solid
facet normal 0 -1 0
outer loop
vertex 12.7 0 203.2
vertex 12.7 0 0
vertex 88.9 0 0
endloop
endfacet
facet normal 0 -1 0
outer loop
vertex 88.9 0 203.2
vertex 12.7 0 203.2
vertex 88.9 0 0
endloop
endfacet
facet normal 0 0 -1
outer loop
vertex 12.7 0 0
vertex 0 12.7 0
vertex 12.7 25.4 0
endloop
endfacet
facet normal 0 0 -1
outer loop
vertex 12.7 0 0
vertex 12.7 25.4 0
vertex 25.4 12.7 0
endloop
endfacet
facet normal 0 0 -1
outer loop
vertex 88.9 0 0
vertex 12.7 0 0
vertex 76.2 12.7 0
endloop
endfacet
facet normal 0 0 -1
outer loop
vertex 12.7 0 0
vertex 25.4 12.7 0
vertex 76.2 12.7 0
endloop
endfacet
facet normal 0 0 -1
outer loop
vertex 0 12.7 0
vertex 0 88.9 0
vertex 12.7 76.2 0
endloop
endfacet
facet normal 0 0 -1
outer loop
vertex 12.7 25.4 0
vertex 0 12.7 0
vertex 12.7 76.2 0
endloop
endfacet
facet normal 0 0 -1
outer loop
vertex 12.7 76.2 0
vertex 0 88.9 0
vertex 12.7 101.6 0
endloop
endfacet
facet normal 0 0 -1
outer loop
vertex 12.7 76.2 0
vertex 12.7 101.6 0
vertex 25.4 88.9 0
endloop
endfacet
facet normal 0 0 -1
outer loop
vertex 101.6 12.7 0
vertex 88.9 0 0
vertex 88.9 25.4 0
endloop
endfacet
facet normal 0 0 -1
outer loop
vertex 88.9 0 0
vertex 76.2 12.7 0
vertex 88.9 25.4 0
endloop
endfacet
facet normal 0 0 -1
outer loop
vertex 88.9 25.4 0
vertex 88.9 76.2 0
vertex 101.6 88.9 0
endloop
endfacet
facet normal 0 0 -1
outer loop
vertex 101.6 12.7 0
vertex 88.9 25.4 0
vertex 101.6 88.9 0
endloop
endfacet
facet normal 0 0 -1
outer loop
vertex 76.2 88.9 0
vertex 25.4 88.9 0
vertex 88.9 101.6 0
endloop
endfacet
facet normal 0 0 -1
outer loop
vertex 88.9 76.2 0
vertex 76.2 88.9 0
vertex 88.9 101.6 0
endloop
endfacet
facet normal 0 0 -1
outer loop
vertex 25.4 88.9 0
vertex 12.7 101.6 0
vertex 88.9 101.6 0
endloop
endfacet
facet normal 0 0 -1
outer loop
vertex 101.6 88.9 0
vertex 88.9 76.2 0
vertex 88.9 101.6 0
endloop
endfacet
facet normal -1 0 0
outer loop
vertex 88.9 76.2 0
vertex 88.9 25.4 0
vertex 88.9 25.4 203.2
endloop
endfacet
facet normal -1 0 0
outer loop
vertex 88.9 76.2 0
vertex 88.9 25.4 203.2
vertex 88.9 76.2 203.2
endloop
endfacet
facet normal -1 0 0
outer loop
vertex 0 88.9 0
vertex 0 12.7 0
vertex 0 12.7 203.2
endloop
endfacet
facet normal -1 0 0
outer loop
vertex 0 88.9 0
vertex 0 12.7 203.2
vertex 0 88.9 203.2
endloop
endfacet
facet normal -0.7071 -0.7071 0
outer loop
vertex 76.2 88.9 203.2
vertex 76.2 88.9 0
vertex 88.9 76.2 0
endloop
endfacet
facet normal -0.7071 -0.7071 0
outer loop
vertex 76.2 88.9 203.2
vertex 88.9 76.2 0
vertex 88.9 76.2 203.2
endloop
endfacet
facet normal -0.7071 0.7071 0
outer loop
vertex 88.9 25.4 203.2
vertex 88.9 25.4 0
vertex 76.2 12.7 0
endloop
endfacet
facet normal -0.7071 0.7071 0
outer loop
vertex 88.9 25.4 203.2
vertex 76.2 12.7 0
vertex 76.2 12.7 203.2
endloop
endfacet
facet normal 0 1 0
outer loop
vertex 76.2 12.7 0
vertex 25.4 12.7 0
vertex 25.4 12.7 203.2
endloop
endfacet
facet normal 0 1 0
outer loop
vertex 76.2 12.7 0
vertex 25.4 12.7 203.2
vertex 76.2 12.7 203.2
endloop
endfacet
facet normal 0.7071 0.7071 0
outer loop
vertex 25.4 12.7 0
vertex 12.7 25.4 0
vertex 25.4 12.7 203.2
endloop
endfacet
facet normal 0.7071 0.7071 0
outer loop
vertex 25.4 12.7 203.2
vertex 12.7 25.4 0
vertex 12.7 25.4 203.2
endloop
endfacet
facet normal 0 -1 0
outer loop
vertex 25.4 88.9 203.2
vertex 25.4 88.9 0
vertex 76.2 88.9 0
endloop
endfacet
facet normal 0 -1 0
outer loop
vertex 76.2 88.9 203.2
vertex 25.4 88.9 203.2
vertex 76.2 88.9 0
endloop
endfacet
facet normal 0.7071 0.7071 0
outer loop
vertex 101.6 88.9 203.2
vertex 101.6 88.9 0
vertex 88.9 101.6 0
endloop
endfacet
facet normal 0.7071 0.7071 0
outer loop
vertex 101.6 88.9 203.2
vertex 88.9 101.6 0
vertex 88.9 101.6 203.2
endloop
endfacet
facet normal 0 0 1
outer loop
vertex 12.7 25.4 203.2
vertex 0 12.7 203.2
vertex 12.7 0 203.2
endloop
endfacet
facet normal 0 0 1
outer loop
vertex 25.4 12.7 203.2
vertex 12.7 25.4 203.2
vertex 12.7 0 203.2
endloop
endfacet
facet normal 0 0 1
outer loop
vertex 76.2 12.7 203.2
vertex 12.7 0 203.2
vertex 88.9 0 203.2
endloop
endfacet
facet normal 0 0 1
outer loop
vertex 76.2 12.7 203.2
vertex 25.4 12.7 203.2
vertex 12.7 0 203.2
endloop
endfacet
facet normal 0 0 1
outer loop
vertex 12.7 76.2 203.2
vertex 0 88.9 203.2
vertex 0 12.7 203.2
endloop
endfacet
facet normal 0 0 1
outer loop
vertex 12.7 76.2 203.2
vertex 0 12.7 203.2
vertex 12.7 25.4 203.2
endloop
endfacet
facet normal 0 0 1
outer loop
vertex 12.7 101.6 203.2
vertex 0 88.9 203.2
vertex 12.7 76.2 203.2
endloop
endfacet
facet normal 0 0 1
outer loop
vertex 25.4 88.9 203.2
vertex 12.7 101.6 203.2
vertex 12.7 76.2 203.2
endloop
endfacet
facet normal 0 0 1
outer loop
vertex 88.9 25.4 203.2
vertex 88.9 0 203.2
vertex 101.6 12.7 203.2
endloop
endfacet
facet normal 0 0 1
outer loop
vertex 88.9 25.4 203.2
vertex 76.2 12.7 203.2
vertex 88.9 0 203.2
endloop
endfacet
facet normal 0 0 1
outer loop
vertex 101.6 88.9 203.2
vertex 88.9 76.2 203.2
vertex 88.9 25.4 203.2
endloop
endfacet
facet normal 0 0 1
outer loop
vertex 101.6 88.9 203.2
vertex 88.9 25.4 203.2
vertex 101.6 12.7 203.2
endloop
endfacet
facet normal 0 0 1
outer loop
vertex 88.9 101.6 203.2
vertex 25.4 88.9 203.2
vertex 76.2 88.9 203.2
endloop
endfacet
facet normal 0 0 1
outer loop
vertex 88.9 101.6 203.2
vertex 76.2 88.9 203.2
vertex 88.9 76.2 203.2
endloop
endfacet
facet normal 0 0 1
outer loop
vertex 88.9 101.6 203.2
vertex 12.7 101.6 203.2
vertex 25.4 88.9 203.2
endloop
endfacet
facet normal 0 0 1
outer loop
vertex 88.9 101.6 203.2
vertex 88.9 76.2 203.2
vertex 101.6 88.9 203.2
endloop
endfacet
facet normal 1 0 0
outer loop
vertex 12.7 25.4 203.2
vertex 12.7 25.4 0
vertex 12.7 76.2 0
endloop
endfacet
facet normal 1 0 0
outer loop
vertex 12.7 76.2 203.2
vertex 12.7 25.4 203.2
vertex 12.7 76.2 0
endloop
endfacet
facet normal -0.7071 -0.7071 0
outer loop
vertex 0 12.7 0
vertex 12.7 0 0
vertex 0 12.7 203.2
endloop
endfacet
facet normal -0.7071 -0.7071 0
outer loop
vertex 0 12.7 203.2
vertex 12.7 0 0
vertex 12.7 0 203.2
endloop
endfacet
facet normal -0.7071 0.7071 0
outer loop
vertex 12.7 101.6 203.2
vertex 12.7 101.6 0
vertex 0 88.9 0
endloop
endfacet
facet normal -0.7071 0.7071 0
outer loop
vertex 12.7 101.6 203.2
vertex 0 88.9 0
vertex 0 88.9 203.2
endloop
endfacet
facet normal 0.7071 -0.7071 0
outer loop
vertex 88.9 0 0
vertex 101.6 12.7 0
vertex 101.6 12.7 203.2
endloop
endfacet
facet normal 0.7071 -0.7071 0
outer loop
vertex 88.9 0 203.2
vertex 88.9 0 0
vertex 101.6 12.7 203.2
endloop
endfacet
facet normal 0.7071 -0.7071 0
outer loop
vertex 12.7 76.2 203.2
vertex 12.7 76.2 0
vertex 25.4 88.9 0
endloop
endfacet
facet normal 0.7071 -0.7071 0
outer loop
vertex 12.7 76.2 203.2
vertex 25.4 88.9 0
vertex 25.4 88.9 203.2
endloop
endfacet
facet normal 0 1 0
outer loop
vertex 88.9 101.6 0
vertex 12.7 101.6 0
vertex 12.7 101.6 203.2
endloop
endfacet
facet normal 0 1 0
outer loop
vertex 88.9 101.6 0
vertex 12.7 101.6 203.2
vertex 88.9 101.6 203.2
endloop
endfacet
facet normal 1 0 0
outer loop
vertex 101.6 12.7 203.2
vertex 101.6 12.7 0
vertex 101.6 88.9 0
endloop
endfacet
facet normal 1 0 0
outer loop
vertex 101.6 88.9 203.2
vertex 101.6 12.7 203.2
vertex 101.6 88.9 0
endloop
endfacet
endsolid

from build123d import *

# Parameters (mm, degrees)
F0_W     = 101.6
F0_H     = 101.6
F0_W_2   = 76.2
F0_H_2   = 76.2
F1_DEPTH = 203.2
F2_SIZE  = 12.7
F3_SIZE  = 12.7


with BuildPart() as f1:
    # F0 (on Top) → F1 (new body)
    with BuildSketch(Plane.XY):
        with Locations((50.8, 50.8)):
            Rectangle(F0_W, F0_H)
        with Locations((50.8, 50.8)):
            Rectangle(F0_W_2, F0_H_2, mode=Mode.SUBTRACT)
    extrude(amount=F1_DEPTH)

    # F2
    f2_edges = [f1.edges().sort_by_distance(p)[0] for p in [
        (12.7, 88.9, 101.6),
        (88.9, 88.9, 101.6),
        (88.9, 12.7, 101.6),
        (12.7, 12.7, 101.6),
    ]]
    chamfer(f2_edges, length=F2_SIZE)

    # F3
    f3_edges = [f1.edges().sort_by_distance(p)[0] for p in [
        (101.6, 0, 101.6),
        (101.6, 101.6, 101.6),
        (0, 0, 101.6),
        (0, 101.6, 101.6),
    ]]
    chamfer(f3_edges, length=F3_SIZE)


solid = f1.part
